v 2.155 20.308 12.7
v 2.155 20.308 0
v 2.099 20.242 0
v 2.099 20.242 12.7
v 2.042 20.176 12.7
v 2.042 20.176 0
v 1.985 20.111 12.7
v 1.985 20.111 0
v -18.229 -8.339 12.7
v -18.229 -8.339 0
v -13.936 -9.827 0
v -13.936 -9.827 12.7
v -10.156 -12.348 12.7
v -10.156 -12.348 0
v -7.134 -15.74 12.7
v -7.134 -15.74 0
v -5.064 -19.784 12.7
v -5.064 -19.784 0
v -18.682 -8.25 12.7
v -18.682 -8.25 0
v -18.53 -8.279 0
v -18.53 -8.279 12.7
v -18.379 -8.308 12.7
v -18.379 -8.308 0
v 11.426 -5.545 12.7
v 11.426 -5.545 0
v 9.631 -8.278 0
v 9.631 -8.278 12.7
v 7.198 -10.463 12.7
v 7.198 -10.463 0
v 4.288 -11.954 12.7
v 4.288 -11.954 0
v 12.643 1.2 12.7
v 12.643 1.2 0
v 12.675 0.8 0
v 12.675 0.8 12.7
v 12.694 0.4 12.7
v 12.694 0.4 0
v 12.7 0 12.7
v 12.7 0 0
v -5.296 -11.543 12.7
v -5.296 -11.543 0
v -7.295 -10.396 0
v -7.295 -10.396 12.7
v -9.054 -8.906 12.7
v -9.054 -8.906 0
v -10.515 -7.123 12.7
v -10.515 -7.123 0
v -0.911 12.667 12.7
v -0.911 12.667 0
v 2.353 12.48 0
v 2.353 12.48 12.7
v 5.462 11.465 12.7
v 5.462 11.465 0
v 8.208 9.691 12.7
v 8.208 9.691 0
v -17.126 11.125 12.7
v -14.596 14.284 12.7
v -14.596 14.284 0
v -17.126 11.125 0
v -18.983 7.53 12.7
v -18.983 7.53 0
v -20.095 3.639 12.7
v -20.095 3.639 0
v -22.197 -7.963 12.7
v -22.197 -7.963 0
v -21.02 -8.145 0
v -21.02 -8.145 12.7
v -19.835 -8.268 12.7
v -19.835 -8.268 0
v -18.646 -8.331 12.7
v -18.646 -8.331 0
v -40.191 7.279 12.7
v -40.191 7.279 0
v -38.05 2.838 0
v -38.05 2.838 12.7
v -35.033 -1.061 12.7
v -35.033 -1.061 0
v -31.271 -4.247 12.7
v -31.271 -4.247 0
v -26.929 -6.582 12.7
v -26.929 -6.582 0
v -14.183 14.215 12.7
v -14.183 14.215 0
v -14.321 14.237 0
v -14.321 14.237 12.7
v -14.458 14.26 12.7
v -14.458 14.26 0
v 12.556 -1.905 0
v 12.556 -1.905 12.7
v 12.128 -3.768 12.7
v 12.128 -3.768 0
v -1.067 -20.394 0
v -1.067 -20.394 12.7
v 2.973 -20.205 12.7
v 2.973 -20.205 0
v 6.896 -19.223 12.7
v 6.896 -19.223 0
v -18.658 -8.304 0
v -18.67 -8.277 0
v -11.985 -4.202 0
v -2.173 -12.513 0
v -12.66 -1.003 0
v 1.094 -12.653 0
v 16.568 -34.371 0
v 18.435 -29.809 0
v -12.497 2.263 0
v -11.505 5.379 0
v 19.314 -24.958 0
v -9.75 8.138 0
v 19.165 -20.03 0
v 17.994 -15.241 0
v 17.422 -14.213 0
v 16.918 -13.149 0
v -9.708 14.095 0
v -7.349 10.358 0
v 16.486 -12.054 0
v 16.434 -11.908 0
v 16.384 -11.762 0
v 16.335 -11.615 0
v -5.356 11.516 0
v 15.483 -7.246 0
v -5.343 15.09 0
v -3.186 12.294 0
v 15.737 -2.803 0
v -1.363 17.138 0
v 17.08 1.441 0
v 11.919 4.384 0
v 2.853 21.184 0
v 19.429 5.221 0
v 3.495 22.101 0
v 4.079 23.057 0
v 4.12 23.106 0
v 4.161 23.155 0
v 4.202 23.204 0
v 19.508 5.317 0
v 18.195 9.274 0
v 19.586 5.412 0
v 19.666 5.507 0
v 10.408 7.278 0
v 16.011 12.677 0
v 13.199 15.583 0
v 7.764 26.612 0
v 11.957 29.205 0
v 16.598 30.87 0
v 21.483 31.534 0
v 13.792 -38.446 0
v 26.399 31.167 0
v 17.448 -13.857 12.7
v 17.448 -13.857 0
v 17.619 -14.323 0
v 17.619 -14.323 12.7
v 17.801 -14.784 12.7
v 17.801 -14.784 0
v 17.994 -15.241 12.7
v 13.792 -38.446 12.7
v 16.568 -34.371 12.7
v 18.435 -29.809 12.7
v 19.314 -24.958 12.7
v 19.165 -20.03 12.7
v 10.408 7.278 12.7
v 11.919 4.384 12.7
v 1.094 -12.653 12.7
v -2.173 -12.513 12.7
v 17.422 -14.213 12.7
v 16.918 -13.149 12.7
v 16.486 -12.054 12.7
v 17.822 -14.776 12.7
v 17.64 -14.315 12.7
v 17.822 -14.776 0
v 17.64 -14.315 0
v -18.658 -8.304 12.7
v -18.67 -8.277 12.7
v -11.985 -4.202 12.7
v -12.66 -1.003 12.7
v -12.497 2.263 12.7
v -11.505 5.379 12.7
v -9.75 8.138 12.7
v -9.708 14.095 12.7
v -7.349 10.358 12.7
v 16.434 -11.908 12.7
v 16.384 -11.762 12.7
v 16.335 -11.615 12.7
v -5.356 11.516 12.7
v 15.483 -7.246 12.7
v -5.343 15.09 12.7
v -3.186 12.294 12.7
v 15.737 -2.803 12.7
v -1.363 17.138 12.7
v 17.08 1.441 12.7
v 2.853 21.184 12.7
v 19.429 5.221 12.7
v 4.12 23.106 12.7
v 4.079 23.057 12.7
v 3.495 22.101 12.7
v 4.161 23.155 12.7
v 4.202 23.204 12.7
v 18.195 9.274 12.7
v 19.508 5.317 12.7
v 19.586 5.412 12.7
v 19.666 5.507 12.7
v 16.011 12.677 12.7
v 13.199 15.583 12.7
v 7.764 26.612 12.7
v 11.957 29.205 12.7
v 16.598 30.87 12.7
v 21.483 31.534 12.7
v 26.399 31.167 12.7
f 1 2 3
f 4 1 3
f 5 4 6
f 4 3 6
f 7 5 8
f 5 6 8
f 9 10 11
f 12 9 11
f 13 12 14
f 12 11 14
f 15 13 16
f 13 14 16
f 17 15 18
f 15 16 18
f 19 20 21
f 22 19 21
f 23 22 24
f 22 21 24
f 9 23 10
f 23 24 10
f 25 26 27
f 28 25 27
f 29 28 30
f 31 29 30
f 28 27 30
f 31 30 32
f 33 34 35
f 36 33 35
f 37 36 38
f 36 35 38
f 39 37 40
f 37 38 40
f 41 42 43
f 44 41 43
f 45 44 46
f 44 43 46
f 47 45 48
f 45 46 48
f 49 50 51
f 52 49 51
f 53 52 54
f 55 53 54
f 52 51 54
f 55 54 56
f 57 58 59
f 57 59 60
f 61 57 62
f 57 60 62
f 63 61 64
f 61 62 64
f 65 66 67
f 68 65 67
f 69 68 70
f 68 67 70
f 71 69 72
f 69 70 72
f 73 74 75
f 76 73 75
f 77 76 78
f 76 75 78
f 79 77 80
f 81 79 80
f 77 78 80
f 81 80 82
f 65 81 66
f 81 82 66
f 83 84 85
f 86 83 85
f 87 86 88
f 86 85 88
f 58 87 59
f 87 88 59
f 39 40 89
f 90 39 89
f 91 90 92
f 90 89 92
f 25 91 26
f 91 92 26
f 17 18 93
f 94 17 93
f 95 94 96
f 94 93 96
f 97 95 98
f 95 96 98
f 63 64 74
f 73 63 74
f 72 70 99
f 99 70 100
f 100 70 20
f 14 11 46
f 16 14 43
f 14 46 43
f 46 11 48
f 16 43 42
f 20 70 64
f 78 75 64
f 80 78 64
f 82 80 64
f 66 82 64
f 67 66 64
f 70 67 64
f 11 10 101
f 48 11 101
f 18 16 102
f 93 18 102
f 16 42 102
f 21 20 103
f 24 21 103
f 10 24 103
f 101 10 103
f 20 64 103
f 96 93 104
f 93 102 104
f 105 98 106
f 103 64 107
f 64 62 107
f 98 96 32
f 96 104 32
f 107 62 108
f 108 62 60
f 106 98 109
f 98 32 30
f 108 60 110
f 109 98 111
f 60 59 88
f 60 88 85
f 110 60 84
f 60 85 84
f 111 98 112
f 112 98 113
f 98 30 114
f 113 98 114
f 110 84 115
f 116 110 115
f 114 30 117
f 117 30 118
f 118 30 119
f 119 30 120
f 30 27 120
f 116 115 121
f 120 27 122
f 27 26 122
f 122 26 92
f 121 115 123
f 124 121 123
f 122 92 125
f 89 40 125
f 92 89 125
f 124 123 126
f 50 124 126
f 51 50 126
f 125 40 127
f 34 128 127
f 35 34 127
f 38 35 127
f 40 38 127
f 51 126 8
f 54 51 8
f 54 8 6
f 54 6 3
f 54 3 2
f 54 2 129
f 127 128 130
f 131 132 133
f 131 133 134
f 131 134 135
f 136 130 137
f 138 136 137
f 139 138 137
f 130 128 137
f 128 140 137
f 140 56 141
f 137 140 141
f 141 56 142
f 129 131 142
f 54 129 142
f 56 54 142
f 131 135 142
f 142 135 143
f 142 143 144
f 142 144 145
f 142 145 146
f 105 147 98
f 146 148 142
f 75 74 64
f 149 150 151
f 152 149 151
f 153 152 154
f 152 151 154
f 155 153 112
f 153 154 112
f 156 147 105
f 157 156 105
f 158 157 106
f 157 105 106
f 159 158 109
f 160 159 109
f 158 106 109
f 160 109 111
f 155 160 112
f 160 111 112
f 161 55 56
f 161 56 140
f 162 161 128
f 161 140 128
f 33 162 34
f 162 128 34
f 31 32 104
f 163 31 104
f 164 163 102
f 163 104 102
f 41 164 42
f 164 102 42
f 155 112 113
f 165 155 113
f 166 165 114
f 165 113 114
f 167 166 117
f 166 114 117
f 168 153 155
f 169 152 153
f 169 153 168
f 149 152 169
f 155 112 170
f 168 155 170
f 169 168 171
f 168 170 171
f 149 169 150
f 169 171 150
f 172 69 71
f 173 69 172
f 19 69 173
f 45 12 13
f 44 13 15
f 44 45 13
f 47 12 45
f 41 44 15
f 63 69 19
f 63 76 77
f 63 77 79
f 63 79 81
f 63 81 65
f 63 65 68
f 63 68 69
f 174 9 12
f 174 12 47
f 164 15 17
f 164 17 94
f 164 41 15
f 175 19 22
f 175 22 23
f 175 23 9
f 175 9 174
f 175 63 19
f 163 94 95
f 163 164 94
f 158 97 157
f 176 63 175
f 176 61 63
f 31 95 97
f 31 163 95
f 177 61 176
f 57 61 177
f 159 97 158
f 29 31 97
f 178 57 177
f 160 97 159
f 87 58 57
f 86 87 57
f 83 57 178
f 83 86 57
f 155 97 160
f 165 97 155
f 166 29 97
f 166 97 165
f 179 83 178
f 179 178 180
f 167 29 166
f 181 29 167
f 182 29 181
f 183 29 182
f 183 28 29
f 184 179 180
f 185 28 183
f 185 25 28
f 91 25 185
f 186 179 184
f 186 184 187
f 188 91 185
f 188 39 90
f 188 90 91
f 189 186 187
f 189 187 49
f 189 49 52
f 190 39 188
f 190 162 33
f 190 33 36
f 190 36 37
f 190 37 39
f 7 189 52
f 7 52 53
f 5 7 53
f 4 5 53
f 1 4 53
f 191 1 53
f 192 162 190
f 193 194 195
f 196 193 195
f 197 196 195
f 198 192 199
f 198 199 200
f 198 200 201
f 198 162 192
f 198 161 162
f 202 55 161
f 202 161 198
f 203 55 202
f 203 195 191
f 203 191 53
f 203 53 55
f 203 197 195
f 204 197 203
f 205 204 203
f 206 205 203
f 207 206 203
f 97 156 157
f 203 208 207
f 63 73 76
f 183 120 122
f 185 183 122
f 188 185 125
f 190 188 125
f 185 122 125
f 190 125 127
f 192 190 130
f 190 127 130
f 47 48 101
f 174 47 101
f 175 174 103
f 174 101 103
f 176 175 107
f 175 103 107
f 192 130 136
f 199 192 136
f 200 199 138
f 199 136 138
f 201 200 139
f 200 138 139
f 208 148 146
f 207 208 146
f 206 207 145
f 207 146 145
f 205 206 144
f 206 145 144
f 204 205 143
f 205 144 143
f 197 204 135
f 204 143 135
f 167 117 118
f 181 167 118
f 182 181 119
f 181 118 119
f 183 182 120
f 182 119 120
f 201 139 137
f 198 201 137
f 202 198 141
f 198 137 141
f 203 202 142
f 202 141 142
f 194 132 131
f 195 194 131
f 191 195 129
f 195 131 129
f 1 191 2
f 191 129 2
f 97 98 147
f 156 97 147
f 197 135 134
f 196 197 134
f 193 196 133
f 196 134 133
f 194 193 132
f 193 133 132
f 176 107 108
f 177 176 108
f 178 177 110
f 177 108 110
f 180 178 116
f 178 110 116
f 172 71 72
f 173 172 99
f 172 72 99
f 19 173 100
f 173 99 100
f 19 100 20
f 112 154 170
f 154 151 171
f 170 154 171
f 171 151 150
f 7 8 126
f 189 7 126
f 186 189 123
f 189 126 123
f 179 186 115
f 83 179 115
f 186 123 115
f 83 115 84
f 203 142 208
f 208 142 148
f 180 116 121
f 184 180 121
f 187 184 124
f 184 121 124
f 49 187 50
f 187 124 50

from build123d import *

# Parameters (mm, degrees)
F1_DEPTH = 12.7


# Not quite as in the source:
# - a feature of the source that left no trace in its solid (it failed there, or was rolled back) is left out


with BuildPart() as f1:
    # F0 (on Top) → F1 (new body)
    with BuildSketch(Plane.XY):
        with BuildLine():
            ThreePointArc((-7.3489403011, 10.3577544116), (-4.2883836636, 11.9540689957), (-0.9110245856, 12.667282037))
            ThreePointArc((-0.9110245856, 12.667282037), (0.2194109686, 16.5124994793), (1.9846889119, 20.1107456498))
            ThreePointArc((1.9846889119, 20.1107456498), (-5.3432740228, 15.0903277504), (-14.1828590922, 14.2154720724))
            ThreePointArc((-14.1828590922, 14.2154720724), (-10.6043004202, 12.5728851855), (-7.3489403011, 10.3577544116))
        make_face()
        with BuildLine():
            ThreePointArc((-18.6815829969, -8.250401529), (-18.454845536, -8.2932697378), (-18.2286800533, -8.3390598448))
            ThreePointArc((-18.2286800533, -8.3390598448), (-14.3209728725, -8.0523772846), (-10.5146757481, -7.1226114531))
            ThreePointArc((-10.5146757481, -7.1226114531), (-12.4259555067, -2.6240483505), (-12.4967192607, 2.263185304))
            Line((-12.4967192607, 2.263185304), (-20.0954213497, 3.6393281571))
            ThreePointArc((-20.0954213497, 3.6393281571), (-20.2794337822, -2.4114796562), (-18.6815829969, -8.250401529))
        make_face()
        with BuildLine():
            ThreePointArc((-5.0643582643, -19.7844116422), (0.9578833515, -20.3998315714), (6.8959600381, -19.2228094672))
            Line((6.8959600381, -19.2228094672), (4.2883836636, -11.9540689957))
            ThreePointArc((4.2883836636, -11.9540689957), (-0.5438926438, -12.6883482295), (-5.295608296, -11.5432461975))
            ThreePointArc((-5.295608296, -11.5432461975), (-8.2083355971, -9.6908836917), (-10.5146757481, -7.1226114531))
            ThreePointArc((-10.5146757481, -7.1226114531), (-14.3209728725, -8.0523772846), (-18.2286800533, -8.3390598448))
            ThreePointArc((-18.2286800533, -8.3390598448), (-10.156448241, -12.3478720374), (-5.0643582643, -19.7844116422))
        make_face()
        with BuildLine():
            ThreePointArc((6.8959600381, -19.2228094672), (12.2279291244, -16.3569073478), (16.4855681798, -12.0539085133))
            ThreePointArc((16.4855681798, -12.0539085133), (16.4088993742, -11.8349525851), (16.3350776353, -11.615020425))
            ThreePointArc((16.3350776353, -11.615020425), (14.1333458958, -8.375267358), (11.4257003337, -5.5446705839))
            ThreePointArc((11.4257003337, -5.5446705839), (8.4854702857, -9.4491689598), (4.2883836636, -11.9540689957))
            Line((4.2883836636, -11.9540689957), (6.8959600381, -19.2228094672))
        make_face()
        with BuildLine():
            ThreePointArc((12.6432089432, 1.1996948024), (16.2054891655, 2.9248067913), (19.4293657833, 5.2209930447))
            ThreePointArc((19.4293657833, 5.2209930447), (19.546868725, 5.3645101816), (19.6658540094, 5.5068007715))
            ThreePointArc((19.6658540094, 5.5068007715), (17.187702303, 11.0296671845), (13.1994613117, 15.58348131))
            Line((13.1994613117, 15.58348131), (8.2083355971, 9.6908836917))
            ThreePointArc((8.2083355971, 9.6908836917), (11.2570777566, 5.879472798), (12.6432089432, 1.1996948024))
        make_face()
        with BuildLine():
            ThreePointArc((-0.9110245856, 12.667282037), (3.940485221, 12.0732173104), (8.2083355971, 9.6908836917))
            Line((8.2083355971, 9.6908836917), (13.1994613117, 15.58348131))
            ThreePointArc((13.1994613117, 15.58348131), (8.0325348446, 18.7762896395), (2.1551065289, 20.3082787185))
            ThreePointArc((2.1551065289, 20.3082787185), (2.070257967, 20.2092013887), (1.9846889119, 20.1107456498))
            ThreePointArc((1.9846889119, 20.1107456498), (0.2194109686, 16.5124994793), (-0.9110245856, 12.667282037))
        make_face()
        with BuildLine():
            ThreePointArc((-18.6815829969, -8.250401529), (-20.4319782656, -8.0197287805), (-22.1965884409, -7.9627687686))
            ThreePointArc((-22.1965884409, -7.9627687686), (-20.4281162197, -8.2142893772), (-18.6456789889, -8.3312258223))
            ThreePointArc((-18.6456789889, -8.3312258223), (-18.6636747448, -8.2908331113), (-18.6815829969, -8.250401529))
        make_face()
        with BuildLine():
            ThreePointArc((-40.1908426994, 7.2786563143), (-33.2356793414, -2.7528291756), (-22.1965884409, -7.9627687686))
            Line((-22.1965884409, -7.9627687686), (-40.1908426994, 7.2786563143))
        make_face()
        with BuildLine():
            Line((13.1994613117, 15.58348131), (26.3989226233, 31.1669626201))
            Line((26.3989226233, 31.1669626201), (4.2023341824, 23.2041938515))
            ThreePointArc((4.2023341824, 23.2041938515), (4.1403450601, 23.1307053406), (4.0786560627, 23.0569647133))
            ThreePointArc((4.0786560627, 23.0569647133), (3.1814863156, 21.6374106747), (2.1551065289, 20.3082787185))
            ThreePointArc((2.1551065289, 20.3082787185), (8.0325348446, 18.7762896395), (13.1994613117, 15.58348131))
        make_face()
        with BuildLine():
            Line((4.2023341824, 23.2041938515), (26.3989226233, 31.1669626201))
            ThreePointArc((26.3989226233, 31.1669626201), (14.2338196723, 30.1593572095), (4.2023341824, 23.2041938515))
        make_face()
        with BuildLine():
            ThreePointArc((13.7919200761, -38.4456189344), (19.0018596691, -27.4065280339), (17.9942542585, -15.2414250829))
            Line((17.9942542585, -15.2414250829), (13.7919200761, -38.4456189344))
        make_face()
        with BuildLine():
            ThreePointArc((11.4257003337, -5.5446705839), (14.1333458958, -8.375267358), (16.3350776353, -11.615020425))
            ThreePointArc((16.3350776353, -11.615020425), (15.7367201589, -2.8026923129), (19.4293657833, 5.2209930447))
            ThreePointArc((19.4293657833, 5.2209930447), (16.2054891655, 2.9248067913), (12.6432089432, 1.1996948024))
            ThreePointArc((12.6432089432, 1.1996948024), (12.6857942908, 0.6005191177), (12.7, 0))
            ThreePointArc((12.7, 0), (12.3773259277, -2.8446094426), (11.4257003337, -5.5446705839))
        make_face()
        with BuildLine():
            Line((-20.0954213497, 3.6393281571), (-12.4967192607, 2.263185304))
            ThreePointArc((-12.4967192607, 2.263185304), (-10.7164855769, 6.8151989612), (-7.3489403011, 10.3577544116))
            ThreePointArc((-7.3489403011, 10.3577544116), (-10.6043004202, 12.5728851855), (-14.1828590922, 14.2154720724))
            ThreePointArc((-14.1828590922, 14.2154720724), (-14.3896083966, 14.2484575715), (-14.5959573306, 14.2838614619))
            ThreePointArc((-14.5959573306, 14.2838614619), (-18.1438546347, 9.373964351), (-20.0954213497, 3.6393281571))
        make_face()
        with BuildLine():
            Line((-40.1908426994, 7.2786563143), (-22.1965884409, -7.9627687686))
            ThreePointArc((-22.1965884409, -7.9627687686), (-20.4319782656, -8.0197287805), (-18.6815829969, -8.250401529))
            ThreePointArc((-18.6815829969, -8.250401529), (-20.2794337822, -2.4114796562), (-20.0954213497, 3.6393281571))
            Line((-20.0954213497, 3.6393281571), (-40.1908426994, 7.2786563143))
        make_face()
        with BuildLine():
            Line((13.7919200761, -38.4456189344), (17.9942542585, -15.2414250829))
            ThreePointArc((17.9942542585, -15.2414250829), (17.16114084, -13.6849496708), (16.4855681798, -12.0539085133))
            ThreePointArc((16.4855681798, -12.0539085133), (12.2279291244, -16.3569073478), (6.8959600381, -19.2228094672))
            Line((6.8959600381, -19.2228094672), (13.7919200761, -38.4456189344))
        make_face()
    extrude(amount=F1_DEPTH)


with BuildPart() as f1b:
    # F0 (on Top) → F1, piece 2 (new body)
    with BuildSketch(Plane.XY):
        with BuildLine():
            ThreePointArc((17.4478455198, -13.8573257269), (17.7088929014, -14.5541746878), (17.9942542585, -15.2414250829))
            ThreePointArc((17.9942542585, -15.2414250829), (17.7319700442, -14.5450643934), (17.4478455198, -13.8573257269))
        make_face()
    extrude(amount=F1_DEPTH)


solid = Compound([f1.part, f1b.part])
